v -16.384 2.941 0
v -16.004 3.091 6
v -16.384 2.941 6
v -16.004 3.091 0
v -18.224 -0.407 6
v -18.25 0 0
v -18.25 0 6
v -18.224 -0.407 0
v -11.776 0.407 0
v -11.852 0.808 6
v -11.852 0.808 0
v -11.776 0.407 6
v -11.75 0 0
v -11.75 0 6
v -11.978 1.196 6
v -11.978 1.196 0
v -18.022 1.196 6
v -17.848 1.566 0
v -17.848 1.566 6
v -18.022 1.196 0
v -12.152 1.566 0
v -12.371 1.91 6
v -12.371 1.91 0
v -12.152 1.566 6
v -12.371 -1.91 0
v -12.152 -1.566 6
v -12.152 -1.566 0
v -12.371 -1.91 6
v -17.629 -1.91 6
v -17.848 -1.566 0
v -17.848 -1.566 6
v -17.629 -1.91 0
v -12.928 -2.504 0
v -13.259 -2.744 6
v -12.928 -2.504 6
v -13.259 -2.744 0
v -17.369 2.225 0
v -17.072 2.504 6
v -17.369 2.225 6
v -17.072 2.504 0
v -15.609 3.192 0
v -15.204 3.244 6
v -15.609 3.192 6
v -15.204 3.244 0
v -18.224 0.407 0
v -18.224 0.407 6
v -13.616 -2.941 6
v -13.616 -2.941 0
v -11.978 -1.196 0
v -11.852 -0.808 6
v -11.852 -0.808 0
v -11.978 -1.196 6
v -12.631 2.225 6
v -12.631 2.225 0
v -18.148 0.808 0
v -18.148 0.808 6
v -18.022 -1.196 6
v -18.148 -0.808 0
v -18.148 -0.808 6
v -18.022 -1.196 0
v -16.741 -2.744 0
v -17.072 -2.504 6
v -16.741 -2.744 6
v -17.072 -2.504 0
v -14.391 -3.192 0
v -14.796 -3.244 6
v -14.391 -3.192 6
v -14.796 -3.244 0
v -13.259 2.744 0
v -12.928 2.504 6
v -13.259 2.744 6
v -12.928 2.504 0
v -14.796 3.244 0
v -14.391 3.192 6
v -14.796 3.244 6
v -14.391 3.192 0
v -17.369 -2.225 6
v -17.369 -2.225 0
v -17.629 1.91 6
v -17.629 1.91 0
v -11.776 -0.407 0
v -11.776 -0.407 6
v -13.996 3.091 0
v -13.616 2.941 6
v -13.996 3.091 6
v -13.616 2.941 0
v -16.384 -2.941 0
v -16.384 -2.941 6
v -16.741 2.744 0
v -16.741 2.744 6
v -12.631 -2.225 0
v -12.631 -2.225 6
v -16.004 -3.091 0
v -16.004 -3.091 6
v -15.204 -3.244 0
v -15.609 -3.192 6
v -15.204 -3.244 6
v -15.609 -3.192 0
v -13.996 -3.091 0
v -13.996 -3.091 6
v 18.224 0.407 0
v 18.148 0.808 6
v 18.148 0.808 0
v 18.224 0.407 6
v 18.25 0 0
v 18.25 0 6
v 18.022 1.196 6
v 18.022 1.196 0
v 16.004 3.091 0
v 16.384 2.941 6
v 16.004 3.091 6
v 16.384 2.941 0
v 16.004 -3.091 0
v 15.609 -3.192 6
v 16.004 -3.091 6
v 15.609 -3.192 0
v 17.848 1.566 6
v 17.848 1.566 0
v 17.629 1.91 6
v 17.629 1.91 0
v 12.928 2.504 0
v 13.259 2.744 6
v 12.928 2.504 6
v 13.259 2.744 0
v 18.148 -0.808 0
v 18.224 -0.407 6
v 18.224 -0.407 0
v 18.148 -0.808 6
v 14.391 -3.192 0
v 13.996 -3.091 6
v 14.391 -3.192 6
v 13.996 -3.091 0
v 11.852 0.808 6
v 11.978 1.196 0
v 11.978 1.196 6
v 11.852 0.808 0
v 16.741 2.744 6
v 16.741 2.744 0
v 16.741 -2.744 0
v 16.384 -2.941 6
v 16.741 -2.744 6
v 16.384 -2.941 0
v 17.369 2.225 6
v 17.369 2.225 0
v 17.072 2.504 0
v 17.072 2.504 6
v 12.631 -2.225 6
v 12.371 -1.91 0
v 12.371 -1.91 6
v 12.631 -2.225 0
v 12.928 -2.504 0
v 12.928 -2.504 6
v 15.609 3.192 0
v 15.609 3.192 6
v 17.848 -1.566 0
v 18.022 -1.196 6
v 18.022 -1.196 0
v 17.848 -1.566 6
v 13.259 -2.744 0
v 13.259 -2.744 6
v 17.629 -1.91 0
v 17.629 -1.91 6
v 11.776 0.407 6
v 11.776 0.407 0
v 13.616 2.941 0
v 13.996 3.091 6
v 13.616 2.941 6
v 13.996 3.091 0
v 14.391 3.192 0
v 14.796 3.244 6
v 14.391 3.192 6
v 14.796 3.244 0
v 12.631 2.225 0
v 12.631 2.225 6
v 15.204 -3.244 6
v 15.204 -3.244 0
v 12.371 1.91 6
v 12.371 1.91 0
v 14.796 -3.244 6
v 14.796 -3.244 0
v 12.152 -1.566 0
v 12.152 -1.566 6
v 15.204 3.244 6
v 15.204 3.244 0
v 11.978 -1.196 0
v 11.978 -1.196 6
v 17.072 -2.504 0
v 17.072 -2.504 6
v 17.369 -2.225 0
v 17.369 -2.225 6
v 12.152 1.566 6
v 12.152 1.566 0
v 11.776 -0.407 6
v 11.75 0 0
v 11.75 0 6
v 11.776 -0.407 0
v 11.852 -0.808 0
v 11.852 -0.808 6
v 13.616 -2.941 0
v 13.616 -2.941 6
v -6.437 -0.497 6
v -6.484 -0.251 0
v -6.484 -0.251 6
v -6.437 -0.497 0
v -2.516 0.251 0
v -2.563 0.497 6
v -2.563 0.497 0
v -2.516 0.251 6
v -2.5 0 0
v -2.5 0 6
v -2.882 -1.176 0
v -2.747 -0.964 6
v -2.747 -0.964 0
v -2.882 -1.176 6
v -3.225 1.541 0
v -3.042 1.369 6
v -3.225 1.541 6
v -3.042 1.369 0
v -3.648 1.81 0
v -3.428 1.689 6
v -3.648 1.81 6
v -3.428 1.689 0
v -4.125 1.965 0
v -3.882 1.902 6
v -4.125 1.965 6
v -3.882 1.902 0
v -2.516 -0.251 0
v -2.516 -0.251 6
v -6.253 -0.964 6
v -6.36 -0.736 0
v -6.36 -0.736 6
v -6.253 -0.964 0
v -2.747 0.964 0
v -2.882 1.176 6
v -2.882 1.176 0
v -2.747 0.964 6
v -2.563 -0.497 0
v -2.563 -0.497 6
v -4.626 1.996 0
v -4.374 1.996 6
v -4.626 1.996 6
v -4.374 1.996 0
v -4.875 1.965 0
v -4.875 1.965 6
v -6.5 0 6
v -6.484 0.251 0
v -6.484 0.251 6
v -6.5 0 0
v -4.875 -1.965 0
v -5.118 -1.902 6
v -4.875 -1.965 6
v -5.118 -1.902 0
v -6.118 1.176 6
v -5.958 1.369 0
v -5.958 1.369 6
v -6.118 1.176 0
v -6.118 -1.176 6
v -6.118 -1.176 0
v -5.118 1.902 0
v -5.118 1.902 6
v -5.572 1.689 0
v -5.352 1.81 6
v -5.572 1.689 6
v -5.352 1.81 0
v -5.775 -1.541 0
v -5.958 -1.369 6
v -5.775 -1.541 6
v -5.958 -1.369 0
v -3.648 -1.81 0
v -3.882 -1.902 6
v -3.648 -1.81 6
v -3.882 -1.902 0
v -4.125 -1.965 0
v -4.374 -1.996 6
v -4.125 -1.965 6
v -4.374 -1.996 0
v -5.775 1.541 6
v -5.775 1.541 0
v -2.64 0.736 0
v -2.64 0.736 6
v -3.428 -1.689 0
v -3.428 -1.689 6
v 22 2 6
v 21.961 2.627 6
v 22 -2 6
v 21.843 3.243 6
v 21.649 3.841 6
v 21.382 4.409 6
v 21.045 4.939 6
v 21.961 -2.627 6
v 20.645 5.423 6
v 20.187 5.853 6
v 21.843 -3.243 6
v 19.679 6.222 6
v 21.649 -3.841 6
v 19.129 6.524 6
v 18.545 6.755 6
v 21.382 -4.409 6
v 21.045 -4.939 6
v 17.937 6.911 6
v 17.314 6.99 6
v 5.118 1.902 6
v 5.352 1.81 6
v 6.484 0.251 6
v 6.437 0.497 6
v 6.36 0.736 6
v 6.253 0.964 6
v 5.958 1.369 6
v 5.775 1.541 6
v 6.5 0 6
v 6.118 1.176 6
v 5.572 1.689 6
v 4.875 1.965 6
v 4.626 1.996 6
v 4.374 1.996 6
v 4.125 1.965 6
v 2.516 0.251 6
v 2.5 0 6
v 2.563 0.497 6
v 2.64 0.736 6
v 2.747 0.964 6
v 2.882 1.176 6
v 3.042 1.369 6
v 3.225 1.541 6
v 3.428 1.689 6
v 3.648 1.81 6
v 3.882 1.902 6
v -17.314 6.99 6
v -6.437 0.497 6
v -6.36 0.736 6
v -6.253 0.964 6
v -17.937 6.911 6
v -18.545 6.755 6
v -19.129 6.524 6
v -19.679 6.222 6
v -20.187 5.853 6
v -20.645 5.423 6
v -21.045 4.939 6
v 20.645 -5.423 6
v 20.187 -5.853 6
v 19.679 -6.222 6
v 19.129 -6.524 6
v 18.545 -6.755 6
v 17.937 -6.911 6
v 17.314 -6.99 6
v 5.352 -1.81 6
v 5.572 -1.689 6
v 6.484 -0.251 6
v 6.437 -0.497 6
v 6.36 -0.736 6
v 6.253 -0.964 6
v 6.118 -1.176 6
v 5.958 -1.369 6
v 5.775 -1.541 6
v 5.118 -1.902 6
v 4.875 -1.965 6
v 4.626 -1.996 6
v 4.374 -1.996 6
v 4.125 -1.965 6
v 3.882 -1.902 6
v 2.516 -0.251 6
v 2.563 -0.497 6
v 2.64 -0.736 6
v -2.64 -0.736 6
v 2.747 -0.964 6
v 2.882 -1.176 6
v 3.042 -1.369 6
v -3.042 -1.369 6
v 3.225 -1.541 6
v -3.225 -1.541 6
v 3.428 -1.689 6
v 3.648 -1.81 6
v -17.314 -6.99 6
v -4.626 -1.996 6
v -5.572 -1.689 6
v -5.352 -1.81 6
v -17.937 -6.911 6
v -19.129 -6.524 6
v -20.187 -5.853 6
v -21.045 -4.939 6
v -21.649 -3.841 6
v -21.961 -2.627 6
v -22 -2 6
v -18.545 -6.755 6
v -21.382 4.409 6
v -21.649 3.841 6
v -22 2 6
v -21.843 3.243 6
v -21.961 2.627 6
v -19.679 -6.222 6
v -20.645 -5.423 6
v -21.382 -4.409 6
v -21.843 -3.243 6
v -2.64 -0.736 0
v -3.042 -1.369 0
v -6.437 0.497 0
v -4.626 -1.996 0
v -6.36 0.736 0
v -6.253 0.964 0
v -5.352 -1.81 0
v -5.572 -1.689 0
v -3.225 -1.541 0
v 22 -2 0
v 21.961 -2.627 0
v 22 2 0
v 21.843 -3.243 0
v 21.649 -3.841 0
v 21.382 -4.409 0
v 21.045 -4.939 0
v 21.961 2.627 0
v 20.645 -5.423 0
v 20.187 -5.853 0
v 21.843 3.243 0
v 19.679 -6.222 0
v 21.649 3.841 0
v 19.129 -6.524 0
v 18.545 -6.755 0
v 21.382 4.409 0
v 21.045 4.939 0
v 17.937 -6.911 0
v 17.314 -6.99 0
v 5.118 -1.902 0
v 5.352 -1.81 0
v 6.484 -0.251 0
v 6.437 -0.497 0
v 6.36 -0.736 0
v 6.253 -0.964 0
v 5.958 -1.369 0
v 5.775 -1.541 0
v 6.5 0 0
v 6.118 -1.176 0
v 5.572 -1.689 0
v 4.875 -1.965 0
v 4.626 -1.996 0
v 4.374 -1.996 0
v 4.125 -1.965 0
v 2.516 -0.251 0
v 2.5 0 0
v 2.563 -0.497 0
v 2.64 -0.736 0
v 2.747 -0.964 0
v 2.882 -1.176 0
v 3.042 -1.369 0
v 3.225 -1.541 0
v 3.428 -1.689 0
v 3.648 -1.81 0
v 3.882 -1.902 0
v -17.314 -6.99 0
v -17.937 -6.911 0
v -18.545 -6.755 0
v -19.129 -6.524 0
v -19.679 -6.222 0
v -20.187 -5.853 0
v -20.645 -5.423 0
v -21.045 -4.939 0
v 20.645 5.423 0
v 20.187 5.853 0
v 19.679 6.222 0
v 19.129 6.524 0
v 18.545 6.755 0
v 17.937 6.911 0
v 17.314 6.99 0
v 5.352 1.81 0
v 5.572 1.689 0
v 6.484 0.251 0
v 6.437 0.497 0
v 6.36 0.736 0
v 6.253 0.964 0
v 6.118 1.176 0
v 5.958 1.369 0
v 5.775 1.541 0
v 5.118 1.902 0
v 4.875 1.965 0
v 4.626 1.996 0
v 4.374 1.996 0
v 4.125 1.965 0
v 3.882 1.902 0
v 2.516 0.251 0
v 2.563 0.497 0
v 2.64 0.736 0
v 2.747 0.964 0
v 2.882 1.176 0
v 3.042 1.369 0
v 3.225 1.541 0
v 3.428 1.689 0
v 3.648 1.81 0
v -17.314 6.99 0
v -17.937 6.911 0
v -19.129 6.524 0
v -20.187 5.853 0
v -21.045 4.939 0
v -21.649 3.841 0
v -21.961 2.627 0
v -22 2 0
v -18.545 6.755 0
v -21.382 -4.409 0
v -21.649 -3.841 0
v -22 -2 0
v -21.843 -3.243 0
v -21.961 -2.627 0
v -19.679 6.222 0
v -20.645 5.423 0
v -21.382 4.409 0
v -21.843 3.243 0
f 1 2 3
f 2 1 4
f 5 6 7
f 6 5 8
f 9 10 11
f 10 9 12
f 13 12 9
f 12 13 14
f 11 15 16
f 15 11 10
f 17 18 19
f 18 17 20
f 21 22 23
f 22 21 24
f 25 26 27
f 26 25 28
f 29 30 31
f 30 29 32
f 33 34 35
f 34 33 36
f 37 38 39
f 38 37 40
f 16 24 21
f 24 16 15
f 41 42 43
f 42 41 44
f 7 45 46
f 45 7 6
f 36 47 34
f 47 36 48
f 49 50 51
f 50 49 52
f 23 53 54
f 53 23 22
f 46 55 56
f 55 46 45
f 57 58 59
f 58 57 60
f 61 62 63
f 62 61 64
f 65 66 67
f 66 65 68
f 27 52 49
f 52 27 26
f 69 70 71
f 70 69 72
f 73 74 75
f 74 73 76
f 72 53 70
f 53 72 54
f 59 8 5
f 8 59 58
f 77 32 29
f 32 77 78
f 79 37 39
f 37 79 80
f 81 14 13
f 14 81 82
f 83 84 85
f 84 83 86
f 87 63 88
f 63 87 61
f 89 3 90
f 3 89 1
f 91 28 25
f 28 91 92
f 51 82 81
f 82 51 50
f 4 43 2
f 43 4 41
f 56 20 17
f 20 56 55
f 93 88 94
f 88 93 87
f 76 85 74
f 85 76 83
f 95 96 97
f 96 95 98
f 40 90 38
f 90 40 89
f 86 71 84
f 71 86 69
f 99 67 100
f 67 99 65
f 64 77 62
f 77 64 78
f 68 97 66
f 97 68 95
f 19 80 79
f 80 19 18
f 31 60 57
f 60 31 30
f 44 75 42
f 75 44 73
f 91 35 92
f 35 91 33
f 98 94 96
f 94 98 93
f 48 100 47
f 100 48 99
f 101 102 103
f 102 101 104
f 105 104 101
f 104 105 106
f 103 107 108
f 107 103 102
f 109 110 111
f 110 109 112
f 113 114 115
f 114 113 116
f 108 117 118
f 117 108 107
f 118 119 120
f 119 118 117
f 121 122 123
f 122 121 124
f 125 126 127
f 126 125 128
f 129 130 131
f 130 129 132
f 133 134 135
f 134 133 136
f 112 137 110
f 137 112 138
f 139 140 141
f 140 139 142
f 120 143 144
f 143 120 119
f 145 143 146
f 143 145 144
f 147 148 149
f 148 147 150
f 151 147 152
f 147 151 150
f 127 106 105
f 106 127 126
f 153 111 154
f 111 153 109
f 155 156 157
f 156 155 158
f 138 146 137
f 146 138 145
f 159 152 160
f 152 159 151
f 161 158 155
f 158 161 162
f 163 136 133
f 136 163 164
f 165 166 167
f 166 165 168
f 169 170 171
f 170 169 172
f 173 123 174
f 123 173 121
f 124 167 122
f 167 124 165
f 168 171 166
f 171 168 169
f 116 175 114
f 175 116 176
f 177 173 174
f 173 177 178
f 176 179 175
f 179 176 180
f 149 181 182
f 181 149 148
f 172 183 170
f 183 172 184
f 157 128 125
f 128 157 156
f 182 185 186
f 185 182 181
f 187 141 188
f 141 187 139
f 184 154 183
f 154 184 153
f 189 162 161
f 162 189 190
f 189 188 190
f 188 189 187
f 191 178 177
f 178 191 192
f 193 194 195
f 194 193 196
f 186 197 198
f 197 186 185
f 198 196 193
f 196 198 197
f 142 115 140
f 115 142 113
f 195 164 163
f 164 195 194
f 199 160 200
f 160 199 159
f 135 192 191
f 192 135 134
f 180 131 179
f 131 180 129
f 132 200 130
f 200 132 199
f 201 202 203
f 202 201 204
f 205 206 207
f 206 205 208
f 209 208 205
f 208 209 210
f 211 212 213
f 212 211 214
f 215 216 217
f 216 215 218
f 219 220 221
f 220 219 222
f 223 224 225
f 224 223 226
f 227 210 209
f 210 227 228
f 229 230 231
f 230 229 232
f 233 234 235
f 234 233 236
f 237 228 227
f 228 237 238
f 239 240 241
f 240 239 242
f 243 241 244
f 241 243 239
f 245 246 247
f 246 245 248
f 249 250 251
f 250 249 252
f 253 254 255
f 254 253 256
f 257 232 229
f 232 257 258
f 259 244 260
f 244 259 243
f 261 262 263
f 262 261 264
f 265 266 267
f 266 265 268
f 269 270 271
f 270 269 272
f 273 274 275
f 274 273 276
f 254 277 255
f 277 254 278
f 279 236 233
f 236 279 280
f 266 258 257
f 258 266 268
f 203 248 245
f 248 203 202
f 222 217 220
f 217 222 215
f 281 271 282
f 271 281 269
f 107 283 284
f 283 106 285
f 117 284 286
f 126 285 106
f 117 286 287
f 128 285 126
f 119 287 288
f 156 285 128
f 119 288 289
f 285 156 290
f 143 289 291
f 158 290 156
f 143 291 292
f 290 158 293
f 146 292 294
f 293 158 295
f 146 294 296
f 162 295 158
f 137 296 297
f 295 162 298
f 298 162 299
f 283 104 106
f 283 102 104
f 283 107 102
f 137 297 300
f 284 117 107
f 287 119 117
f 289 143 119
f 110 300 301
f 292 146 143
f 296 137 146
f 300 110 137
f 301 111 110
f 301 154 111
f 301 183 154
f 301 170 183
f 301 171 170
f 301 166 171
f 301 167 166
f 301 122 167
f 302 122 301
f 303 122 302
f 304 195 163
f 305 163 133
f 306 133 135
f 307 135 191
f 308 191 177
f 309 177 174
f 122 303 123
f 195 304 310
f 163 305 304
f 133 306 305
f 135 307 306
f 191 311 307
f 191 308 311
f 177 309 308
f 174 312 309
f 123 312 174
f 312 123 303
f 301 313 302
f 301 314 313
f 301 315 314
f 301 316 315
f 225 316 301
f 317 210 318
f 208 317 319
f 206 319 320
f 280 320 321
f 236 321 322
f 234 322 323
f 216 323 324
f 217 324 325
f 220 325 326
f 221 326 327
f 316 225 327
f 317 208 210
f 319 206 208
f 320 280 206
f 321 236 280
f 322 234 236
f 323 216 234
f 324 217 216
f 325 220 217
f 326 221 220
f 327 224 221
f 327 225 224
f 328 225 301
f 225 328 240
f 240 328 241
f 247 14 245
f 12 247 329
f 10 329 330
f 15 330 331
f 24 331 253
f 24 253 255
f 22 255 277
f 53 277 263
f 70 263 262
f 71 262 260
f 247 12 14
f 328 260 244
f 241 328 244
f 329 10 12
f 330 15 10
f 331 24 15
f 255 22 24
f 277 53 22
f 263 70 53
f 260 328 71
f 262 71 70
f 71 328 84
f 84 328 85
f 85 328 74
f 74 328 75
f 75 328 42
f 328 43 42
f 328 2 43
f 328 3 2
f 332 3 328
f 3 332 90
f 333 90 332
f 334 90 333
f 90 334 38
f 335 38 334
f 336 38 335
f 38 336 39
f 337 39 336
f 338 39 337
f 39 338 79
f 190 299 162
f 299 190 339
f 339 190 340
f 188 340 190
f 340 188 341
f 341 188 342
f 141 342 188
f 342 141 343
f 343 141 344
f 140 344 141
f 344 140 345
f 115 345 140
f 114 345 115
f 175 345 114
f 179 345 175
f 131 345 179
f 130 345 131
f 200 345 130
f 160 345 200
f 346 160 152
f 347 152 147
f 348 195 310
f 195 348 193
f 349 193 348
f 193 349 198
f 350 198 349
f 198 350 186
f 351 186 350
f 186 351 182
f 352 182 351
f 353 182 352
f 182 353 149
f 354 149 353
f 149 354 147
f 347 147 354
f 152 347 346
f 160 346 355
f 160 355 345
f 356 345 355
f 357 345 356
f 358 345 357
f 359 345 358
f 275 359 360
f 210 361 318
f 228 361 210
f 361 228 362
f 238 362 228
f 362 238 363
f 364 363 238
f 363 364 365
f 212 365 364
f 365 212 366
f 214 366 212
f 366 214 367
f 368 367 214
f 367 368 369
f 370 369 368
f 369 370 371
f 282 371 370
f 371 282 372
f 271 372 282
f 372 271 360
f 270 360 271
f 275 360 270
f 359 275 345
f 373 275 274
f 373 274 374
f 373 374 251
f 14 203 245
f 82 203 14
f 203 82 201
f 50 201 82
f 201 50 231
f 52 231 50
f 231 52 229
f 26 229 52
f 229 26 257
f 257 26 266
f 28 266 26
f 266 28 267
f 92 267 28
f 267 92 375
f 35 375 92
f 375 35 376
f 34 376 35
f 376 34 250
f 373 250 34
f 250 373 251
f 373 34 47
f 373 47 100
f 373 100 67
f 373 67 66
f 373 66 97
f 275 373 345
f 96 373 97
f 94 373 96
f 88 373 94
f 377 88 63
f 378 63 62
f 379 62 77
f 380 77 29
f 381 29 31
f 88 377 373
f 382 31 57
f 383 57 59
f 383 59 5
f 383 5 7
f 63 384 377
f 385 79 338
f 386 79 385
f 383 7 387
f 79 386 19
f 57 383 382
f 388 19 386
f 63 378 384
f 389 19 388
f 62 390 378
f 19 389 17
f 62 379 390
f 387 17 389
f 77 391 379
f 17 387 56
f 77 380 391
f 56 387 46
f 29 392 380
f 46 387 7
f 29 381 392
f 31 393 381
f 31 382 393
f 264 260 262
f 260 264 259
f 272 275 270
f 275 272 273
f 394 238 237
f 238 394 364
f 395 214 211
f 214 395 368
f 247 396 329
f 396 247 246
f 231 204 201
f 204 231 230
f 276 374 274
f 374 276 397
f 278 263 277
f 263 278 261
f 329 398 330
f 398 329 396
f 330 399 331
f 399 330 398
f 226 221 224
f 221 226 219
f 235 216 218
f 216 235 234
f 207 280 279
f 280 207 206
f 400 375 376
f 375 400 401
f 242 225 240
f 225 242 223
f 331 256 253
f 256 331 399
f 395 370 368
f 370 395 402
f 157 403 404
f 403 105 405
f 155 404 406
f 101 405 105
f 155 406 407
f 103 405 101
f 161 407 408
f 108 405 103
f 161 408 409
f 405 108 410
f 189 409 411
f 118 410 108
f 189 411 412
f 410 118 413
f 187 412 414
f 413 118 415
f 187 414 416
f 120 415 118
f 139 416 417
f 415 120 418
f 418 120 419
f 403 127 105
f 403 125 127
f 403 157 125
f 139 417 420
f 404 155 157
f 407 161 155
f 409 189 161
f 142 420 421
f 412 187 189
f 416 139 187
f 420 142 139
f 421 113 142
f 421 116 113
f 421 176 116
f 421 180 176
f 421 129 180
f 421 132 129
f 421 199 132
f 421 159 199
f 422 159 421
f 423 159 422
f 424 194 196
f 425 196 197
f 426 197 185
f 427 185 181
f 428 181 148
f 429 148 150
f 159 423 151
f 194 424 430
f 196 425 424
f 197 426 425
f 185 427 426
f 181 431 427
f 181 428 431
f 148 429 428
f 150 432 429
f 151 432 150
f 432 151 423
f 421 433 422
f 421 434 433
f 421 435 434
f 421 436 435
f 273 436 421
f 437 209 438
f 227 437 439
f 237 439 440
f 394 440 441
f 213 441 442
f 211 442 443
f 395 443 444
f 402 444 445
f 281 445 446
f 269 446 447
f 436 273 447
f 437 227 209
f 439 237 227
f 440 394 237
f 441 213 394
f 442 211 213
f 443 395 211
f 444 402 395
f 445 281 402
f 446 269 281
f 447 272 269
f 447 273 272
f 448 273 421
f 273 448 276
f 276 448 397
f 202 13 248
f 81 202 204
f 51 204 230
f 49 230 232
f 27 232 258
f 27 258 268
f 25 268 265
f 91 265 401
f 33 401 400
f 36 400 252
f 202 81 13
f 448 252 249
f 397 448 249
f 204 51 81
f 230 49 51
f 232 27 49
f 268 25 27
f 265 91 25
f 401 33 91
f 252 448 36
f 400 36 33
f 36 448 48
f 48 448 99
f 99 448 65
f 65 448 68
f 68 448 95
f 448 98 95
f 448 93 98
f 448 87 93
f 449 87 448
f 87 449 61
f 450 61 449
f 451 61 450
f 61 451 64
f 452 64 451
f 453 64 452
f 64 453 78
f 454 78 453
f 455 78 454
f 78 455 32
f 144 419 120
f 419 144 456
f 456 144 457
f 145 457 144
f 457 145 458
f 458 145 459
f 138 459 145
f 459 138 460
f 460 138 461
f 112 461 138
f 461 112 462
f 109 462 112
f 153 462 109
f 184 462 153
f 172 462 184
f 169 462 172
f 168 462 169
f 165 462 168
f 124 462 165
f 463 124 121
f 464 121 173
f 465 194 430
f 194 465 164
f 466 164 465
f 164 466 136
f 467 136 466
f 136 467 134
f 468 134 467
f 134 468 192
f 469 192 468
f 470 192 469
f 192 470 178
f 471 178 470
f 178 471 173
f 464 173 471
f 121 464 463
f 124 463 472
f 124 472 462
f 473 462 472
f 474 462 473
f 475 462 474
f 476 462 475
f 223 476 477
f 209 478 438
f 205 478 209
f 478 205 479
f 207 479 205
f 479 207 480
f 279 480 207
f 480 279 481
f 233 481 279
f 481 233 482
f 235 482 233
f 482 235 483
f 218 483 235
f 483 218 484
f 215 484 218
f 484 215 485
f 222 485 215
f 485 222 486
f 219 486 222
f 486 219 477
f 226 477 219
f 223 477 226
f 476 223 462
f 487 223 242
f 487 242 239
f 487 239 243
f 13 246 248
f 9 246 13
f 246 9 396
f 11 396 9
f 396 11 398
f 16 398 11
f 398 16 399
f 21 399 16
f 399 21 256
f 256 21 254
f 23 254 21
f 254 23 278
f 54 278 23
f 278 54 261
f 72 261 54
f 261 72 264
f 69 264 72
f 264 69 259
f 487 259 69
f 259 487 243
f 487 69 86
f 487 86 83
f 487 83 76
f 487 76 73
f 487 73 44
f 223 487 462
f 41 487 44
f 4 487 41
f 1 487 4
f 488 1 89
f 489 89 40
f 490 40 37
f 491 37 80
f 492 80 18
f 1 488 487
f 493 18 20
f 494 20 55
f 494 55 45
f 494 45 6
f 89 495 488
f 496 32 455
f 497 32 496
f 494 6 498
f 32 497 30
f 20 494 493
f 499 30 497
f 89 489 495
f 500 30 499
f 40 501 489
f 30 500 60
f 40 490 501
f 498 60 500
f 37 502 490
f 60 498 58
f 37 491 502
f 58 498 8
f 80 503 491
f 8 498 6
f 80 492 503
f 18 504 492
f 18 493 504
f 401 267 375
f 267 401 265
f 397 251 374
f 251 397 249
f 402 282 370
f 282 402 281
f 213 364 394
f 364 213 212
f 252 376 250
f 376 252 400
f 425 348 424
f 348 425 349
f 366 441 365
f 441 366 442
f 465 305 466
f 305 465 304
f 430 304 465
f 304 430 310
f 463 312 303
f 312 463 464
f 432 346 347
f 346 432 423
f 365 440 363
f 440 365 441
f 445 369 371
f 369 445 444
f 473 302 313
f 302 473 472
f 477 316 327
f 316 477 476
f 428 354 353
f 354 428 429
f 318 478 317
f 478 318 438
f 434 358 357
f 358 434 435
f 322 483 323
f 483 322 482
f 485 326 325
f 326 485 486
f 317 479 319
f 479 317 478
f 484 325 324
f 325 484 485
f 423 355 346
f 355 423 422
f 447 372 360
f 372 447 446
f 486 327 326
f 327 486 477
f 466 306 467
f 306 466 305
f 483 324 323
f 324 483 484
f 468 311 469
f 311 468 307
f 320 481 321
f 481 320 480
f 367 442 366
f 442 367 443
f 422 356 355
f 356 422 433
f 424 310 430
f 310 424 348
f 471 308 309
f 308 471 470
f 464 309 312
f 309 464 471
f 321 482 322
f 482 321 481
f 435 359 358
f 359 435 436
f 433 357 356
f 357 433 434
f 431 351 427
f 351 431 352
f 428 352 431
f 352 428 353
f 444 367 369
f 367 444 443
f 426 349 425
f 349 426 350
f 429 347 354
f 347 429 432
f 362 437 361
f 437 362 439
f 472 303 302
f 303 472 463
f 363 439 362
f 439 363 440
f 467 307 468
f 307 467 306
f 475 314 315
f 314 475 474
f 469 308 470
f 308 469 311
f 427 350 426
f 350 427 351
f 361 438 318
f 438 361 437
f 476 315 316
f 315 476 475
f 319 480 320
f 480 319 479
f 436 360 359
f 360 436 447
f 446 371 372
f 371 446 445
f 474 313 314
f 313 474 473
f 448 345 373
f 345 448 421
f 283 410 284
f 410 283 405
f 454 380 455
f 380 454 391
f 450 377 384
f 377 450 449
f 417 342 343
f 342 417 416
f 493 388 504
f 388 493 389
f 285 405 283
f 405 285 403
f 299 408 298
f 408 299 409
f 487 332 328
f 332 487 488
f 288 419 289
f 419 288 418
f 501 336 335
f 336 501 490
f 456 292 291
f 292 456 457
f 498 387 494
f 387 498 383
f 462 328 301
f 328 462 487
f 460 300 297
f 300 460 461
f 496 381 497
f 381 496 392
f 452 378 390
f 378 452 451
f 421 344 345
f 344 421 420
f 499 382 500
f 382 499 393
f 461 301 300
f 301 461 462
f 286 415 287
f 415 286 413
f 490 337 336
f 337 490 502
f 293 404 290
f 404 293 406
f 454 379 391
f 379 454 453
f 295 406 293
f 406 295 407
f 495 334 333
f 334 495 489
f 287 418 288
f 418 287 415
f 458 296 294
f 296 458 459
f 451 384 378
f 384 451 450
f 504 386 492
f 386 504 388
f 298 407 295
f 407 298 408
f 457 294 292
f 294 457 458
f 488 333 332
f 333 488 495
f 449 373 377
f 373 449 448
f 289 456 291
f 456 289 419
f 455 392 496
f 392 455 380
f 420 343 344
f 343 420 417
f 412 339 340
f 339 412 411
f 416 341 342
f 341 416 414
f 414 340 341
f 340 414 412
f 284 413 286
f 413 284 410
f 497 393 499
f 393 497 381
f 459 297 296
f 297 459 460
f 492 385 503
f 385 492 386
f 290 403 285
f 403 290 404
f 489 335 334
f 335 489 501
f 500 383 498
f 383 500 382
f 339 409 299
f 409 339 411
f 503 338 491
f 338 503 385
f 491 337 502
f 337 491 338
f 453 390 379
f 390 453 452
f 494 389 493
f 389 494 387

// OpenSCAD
$fn = 50;


difference() {
	union() {
		hull() {
			translate(v = [-17.0000000000, 2.0000000000, 0]) {
				cylinder(h = 6, r = 5);
			}
			translate(v = [17.0000000000, 2.0000000000, 0]) {
				cylinder(h = 6, r = 5);
			}
			translate(v = [-17.0000000000, -2.0000000000, 0]) {
				cylinder(h = 6, r = 5);
			}
			translate(v = [17.0000000000, -2.0000000000, 0]) {
				cylinder(h = 6, r = 5);
			}
		}
	}
	union() {
		#translate(v = [-15.0000000000, 0.0000000000, 0]) {
			cylinder(h = 6, r = 3.2500000000);
		}
		#translate(v = [15.0000000000, 0.0000000000, 0]) {
			cylinder(h = 6, r = 3.2500000000);
		}
		#translate(v = [-15.0000000000, 0.0000000000, -100.0000000000]) {
			cylinder(h = 200, r = 3.2500000000);
		}
		#translate(v = [-15.0000000000, 0.0000000000, -100.0000000000]) {
			cylinder(h = 200, r = 3.2500000000);
		}
		#translate(v = [15.0000000000, 0.0000000000, -100.0000000000]) {
			cylinder(h = 200, r = 3.2500000000);
		}
		#translate(v = [15.0000000000, 0.0000000000, -100.0000000000]) {
			cylinder(h = 200, r = 3.2500000000);
		}
		#translate(v = [-15.0000000000, 0.0000000000, 0]) {
			cylinder(h = 6, r = 1.8000000000);
		}
		#translate(v = [15.0000000000, 0.0000000000, 0]) {
			cylinder(h = 6, r = 1.8000000000);
		}
		#translate(v = [-15.0000000000, 0.0000000000, 0]) {
			cylinder(h = 6, r = 1.8000000000);
		}
		#translate(v = [15.0000000000, 0.0000000000, 0]) {
			cylinder(h = 6, r = 1.8000000000);
		}
		#translate(v = [-15.0000000000, 0.0000000000, 0]) {
			cylinder(h = 6, r = 1.8000000000);
		}
		#translate(v = [15.0000000000, 0.0000000000, 0]) {
			cylinder(h = 6, r = 1.8000000000);
		}
		#translate(v = [-4.5000000000, 0, 0]) {
			cylinder(h = 6, r = 2.0000000000);
		}
		#translate(v = [4.5000000000, 0, 0]) {
			cylinder(h = 6, r = 2.0000000000);
		}
	}
}
